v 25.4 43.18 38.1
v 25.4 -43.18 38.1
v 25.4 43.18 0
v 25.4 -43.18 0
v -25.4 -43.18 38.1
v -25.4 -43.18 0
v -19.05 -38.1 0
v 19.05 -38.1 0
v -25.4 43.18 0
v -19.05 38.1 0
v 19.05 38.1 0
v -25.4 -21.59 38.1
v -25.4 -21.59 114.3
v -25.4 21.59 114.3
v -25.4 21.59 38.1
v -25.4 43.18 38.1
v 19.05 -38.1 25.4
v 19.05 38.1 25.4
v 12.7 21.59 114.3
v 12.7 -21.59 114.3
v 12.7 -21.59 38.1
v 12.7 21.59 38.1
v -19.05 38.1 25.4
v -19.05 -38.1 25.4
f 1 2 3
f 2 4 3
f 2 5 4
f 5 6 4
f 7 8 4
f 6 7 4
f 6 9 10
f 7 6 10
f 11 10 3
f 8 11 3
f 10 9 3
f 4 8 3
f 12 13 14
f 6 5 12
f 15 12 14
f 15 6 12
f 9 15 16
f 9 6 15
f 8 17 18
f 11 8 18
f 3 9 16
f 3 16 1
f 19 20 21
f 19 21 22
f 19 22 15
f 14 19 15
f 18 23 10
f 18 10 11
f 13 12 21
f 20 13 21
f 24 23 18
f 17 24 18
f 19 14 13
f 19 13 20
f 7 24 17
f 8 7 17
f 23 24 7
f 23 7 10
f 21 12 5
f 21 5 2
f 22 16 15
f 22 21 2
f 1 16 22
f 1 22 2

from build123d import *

# Parameters (mm, degrees)
F0_W     = 50.8
F0_H     = 86.36
F1_DEPTH = 25.4
F2_W     = 38.1
F2_H     = 76.2
F3_DEPTH = 101.6
F4_W     = 50.8
F4_H     = 86.36
F4_W_2   = 38.1
F4_H_2   = 76.2
F5_DEPTH = 12.7
F6_W     = 12.7
F6_H     = 21.59
F7_DEPTH = 76.2


with BuildPart() as f1:
    # F0 (on Top) → F1 (new body)
    with BuildSketch(Plane.XY):
        Rectangle(F0_W, F0_H)
    extrude(amount=F1_DEPTH)

    # F2 (on face) → F3 (cut)
    with BuildSketch(Plane.XY.offset(25.4)):
        Rectangle(F2_W, F2_H)
    extrude(amount=-F3_DEPTH, mode=Mode.SUBTRACT)

    # F4 (on face) → F5 (join)
    with BuildSketch(Plane.XY.offset(25.4)):
        Rectangle(F4_W, F4_H)
        Rectangle(F4_W_2, F4_H_2, mode=Mode.SUBTRACT)
        Rectangle(F4_W_2, F4_H_2)
    extrude(amount=F5_DEPTH)

    # F6 (on face) → F7 (join)
    with BuildSketch(Plane.XY.offset(38.1)):
        with Locations((-19.05, 10.795)):
            Rectangle(F6_W, F6_H)
        with Locations((-6.35, 10.795)):
            Rectangle(F6_W, F6_H)
        with Locations((-19.05, -10.795)):
            Rectangle(F6_W, F6_H)
        Polygon((12.7, 21.59), (0, 21.59), (0, 0), (0, -21.59), (12.7, -21.59), (12.7, 0), align=None)
        with Locations((-6.35, -10.795)):
            Rectangle(F6_W, F6_H)
    extrude(amount=F7_DEPTH)


solid = f1.part
